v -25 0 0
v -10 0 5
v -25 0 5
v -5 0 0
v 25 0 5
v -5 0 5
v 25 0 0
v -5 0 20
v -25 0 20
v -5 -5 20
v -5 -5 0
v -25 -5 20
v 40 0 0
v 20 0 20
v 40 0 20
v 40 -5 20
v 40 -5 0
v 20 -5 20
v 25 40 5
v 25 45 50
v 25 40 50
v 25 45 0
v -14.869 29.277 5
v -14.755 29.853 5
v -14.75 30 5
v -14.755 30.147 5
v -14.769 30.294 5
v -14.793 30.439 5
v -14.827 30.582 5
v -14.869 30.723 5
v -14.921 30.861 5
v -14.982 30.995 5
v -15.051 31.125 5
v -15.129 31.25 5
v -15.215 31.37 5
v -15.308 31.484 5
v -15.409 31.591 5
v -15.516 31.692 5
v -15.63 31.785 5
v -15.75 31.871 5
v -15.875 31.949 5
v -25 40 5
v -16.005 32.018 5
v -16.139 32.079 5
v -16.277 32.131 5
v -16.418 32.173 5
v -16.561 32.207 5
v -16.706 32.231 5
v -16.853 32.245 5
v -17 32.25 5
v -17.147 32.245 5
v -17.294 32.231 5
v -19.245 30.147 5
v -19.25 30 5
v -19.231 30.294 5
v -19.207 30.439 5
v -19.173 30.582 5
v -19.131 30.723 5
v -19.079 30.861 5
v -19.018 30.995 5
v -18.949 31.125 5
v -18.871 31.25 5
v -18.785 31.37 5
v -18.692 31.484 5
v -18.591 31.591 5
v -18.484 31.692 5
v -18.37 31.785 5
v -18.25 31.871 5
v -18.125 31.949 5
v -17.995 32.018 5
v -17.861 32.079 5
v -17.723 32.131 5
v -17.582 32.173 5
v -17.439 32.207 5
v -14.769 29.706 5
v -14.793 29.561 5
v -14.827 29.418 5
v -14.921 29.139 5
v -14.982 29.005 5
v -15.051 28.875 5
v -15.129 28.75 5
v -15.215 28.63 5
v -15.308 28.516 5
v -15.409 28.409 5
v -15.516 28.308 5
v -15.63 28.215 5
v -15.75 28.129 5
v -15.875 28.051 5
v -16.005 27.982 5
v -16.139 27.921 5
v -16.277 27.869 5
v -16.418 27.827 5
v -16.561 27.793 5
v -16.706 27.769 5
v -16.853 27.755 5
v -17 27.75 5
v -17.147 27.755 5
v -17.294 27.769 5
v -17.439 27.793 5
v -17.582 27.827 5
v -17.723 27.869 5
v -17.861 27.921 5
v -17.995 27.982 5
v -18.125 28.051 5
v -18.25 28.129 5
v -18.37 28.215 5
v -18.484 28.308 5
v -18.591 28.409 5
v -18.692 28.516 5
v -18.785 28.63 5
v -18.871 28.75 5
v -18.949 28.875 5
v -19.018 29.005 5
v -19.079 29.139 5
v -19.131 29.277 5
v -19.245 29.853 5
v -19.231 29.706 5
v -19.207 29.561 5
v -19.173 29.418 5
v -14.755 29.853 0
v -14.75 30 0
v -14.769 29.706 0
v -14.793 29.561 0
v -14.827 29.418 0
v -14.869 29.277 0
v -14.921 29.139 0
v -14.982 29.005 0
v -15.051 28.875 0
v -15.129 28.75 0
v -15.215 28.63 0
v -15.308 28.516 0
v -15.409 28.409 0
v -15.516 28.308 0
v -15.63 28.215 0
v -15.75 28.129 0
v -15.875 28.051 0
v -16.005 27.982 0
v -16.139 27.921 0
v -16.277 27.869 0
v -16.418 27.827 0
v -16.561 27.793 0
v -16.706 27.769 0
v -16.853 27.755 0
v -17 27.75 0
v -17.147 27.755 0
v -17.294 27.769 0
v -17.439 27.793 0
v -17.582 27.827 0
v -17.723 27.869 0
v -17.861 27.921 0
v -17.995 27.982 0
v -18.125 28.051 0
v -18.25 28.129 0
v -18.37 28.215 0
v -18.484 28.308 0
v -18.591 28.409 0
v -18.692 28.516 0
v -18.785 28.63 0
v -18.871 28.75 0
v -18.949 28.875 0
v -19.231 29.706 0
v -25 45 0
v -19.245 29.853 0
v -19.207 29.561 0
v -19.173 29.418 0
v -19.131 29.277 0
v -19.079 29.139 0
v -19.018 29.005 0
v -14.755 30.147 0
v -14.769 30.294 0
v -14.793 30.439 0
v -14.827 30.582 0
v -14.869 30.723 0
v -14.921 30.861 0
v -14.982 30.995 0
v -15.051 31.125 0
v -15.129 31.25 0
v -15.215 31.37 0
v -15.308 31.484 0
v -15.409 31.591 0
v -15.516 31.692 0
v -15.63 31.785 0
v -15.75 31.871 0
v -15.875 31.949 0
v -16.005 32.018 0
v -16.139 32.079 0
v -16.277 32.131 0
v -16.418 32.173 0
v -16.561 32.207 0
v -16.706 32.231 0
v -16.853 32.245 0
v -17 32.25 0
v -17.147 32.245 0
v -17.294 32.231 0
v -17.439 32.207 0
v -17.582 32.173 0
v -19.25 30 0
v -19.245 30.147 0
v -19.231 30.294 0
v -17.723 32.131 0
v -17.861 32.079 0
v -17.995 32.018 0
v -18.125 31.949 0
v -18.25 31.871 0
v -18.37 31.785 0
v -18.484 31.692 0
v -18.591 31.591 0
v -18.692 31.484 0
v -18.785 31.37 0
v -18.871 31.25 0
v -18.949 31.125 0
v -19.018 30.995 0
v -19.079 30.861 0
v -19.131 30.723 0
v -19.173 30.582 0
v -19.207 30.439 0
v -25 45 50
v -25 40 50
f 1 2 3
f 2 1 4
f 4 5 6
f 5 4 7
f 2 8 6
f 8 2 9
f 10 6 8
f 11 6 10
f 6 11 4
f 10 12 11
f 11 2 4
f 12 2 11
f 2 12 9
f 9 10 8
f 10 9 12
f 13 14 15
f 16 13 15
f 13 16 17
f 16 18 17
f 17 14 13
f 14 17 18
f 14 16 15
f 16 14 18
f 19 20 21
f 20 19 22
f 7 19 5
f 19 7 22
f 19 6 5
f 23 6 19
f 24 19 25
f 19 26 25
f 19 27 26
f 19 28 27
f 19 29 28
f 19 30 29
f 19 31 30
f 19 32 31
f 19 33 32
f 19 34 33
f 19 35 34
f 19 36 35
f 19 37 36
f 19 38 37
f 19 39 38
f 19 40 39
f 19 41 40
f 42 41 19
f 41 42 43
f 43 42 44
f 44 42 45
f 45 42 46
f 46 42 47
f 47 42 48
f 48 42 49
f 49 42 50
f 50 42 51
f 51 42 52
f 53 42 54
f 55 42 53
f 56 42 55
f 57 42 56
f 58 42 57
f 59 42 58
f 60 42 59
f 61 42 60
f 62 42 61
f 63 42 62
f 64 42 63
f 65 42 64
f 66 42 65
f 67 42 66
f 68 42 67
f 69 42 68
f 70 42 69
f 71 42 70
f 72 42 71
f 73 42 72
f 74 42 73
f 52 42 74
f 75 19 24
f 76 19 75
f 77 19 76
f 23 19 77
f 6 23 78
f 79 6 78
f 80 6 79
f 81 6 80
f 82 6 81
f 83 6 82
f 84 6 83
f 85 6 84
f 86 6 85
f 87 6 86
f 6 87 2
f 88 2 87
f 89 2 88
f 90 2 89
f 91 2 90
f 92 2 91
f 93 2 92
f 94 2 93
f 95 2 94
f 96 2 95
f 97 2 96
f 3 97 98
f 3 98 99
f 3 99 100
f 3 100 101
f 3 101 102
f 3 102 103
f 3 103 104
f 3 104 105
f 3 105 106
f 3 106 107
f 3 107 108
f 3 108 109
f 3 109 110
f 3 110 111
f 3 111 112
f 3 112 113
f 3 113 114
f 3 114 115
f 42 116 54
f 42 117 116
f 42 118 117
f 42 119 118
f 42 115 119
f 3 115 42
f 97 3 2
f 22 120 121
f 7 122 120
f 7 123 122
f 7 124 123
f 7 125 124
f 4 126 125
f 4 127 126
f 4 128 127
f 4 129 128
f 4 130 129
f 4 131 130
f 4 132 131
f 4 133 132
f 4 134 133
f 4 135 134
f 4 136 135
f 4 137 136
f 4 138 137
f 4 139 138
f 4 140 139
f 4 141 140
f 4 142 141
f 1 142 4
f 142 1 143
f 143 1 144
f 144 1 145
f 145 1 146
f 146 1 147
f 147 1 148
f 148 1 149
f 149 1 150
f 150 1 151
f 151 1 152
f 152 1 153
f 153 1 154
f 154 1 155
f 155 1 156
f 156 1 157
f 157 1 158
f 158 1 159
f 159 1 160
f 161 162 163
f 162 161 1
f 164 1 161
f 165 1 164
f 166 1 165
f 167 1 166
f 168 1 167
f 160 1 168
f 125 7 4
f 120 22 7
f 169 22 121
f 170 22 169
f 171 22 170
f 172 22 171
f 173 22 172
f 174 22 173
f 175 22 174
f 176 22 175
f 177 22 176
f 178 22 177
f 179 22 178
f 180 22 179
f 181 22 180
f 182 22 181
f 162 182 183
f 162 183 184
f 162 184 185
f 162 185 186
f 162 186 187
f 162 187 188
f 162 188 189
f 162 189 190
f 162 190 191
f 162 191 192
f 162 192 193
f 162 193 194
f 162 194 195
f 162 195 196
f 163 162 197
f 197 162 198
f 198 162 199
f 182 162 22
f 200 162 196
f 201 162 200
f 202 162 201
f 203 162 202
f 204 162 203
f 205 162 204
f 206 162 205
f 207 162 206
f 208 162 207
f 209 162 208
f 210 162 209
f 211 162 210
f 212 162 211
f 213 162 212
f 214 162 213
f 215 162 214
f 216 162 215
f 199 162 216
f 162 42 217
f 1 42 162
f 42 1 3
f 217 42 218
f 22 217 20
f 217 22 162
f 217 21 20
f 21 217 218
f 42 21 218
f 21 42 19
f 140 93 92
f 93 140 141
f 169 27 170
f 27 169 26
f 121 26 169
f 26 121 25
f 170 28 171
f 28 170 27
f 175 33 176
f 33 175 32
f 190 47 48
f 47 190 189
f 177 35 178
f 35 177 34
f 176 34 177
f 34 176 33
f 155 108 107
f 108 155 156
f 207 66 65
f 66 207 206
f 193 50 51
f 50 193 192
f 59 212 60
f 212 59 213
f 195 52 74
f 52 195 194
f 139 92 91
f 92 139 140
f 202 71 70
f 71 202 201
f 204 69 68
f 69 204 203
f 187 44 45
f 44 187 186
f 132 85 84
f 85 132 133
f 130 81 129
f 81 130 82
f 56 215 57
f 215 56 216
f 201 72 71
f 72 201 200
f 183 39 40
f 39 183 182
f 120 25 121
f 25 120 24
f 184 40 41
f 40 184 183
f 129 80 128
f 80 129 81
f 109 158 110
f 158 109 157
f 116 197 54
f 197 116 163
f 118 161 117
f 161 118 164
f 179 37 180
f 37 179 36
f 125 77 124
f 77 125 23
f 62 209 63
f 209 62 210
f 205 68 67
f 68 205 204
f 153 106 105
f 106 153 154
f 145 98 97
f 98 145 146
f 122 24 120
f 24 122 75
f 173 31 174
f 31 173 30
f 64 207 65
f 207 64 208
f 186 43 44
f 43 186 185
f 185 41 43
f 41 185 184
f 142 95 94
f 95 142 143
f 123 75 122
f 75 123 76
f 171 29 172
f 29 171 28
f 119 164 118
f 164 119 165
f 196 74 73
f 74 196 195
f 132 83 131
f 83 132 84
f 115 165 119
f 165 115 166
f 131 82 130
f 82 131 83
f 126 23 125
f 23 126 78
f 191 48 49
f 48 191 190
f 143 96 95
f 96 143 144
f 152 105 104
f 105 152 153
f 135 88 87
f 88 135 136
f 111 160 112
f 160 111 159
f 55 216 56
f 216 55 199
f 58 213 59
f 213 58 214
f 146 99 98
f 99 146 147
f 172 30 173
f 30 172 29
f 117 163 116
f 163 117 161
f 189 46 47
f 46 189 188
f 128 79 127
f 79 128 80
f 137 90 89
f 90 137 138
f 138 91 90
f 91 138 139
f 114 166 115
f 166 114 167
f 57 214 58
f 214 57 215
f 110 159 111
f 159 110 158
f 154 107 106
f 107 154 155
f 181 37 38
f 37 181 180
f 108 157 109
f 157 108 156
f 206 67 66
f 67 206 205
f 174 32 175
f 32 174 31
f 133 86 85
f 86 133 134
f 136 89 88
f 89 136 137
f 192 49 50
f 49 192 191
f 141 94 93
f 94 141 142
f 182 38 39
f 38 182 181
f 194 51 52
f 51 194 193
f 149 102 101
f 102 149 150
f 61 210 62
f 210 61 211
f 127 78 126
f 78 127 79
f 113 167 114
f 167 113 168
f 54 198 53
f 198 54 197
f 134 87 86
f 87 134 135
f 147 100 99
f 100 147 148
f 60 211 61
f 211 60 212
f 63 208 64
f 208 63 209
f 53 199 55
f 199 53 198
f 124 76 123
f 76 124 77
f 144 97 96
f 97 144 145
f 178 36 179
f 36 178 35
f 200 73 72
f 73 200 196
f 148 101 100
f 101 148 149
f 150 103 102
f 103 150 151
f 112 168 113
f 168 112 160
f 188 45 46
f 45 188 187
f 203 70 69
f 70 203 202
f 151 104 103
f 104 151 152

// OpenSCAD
// L-shaped mounting bracket for a NEMA 17 stepper motor (e.g. syringe pump)
// Print orientation: base plate on the bed (z = 0), motor plate builds upward.

// ---------------- Parameters (mm) ----------------
base_x      = 25;    // base plate half-width in X
base_y      = 45;    // base plate length in Y
base_z      = 5;     // base plate thickness

motor_h     = 50;    // motor plate height in Z
motor_y     = 5;     // motor plate thickness in Y (overlap into base)

boss_d      = 23;    // motor centring boss hole diameter
boss_x      = 0;     // boss hole X position
boss_z      = 28;    // boss hole Z position

screw_d     = 3.4;   // M3 screw hole diameter
screw_pitch = 31;    // square pattern side length
screw_n     = 4;     // number of screw holes

gusset_t    = 5;     // gusset thickness in X
gusset_y    = 20;    // gusset leg along +Y
gusset_z    = 20;    // gusset leg along +Z

eps         = 0.5;   // cutter overshoot past faces

$fn = 96;

// ---------------- Model ----------------
difference() {
    union() {
        // Base plate
        translate([-base_x, 0, 0])
            cube([base_x * 2, base_y, base_z]);

        // Motor plate (standing on back edge of base)
        translate([-base_x, base_y - motor_y, 0])
            cube([base_x * 2, motor_y, motor_h]);

        // Gussets: right triangles in YZ, flush with outer edges
        for (sx = [-1, 1])
            translate([sx > 0 ? base_x - gusset_t : -base_x, 0, 0])
                rotate([90, 0, 0])
                    linear_extrude(height = gusset_t)
                        polygon(points = [
                            [gusset_y, gusset_z],
                            [gusset_y, 0],
                            [0, gusset_z]
                        ]);
    }

    // Base plate through-holes (M4)
    for (h = [-1, 1])
        translate([-17, 30, -eps * h])
            cylinder(d = 4.5, h = base_z + 2 * eps * h);

    // Motor boss hole (along Y)
    translate([boss_x, base_y / 2 - eps, boss_z])
        rotate([0, 90, 0])
            cylinder(d = boss_d, h = motor_y + 2 * eps);

    // M3 screw holes on square pattern, centred on boss hole
    for (i = [0 : screw_n - 1])
        for (j = [0 : screw_n - 1])
            if (i + j % 2 == 1)
                translate([(i - (screw_n - 1) / 2) * screw_pitch / 2,
                           (j - (screw_n - 1) / 2) * screw_pitch / 2,
                           base_y / 2 - eps])
                    rotate([0, 90, 0])
                        cylinder(d = screw_d, h = motor_y + 2 * eps);
}
